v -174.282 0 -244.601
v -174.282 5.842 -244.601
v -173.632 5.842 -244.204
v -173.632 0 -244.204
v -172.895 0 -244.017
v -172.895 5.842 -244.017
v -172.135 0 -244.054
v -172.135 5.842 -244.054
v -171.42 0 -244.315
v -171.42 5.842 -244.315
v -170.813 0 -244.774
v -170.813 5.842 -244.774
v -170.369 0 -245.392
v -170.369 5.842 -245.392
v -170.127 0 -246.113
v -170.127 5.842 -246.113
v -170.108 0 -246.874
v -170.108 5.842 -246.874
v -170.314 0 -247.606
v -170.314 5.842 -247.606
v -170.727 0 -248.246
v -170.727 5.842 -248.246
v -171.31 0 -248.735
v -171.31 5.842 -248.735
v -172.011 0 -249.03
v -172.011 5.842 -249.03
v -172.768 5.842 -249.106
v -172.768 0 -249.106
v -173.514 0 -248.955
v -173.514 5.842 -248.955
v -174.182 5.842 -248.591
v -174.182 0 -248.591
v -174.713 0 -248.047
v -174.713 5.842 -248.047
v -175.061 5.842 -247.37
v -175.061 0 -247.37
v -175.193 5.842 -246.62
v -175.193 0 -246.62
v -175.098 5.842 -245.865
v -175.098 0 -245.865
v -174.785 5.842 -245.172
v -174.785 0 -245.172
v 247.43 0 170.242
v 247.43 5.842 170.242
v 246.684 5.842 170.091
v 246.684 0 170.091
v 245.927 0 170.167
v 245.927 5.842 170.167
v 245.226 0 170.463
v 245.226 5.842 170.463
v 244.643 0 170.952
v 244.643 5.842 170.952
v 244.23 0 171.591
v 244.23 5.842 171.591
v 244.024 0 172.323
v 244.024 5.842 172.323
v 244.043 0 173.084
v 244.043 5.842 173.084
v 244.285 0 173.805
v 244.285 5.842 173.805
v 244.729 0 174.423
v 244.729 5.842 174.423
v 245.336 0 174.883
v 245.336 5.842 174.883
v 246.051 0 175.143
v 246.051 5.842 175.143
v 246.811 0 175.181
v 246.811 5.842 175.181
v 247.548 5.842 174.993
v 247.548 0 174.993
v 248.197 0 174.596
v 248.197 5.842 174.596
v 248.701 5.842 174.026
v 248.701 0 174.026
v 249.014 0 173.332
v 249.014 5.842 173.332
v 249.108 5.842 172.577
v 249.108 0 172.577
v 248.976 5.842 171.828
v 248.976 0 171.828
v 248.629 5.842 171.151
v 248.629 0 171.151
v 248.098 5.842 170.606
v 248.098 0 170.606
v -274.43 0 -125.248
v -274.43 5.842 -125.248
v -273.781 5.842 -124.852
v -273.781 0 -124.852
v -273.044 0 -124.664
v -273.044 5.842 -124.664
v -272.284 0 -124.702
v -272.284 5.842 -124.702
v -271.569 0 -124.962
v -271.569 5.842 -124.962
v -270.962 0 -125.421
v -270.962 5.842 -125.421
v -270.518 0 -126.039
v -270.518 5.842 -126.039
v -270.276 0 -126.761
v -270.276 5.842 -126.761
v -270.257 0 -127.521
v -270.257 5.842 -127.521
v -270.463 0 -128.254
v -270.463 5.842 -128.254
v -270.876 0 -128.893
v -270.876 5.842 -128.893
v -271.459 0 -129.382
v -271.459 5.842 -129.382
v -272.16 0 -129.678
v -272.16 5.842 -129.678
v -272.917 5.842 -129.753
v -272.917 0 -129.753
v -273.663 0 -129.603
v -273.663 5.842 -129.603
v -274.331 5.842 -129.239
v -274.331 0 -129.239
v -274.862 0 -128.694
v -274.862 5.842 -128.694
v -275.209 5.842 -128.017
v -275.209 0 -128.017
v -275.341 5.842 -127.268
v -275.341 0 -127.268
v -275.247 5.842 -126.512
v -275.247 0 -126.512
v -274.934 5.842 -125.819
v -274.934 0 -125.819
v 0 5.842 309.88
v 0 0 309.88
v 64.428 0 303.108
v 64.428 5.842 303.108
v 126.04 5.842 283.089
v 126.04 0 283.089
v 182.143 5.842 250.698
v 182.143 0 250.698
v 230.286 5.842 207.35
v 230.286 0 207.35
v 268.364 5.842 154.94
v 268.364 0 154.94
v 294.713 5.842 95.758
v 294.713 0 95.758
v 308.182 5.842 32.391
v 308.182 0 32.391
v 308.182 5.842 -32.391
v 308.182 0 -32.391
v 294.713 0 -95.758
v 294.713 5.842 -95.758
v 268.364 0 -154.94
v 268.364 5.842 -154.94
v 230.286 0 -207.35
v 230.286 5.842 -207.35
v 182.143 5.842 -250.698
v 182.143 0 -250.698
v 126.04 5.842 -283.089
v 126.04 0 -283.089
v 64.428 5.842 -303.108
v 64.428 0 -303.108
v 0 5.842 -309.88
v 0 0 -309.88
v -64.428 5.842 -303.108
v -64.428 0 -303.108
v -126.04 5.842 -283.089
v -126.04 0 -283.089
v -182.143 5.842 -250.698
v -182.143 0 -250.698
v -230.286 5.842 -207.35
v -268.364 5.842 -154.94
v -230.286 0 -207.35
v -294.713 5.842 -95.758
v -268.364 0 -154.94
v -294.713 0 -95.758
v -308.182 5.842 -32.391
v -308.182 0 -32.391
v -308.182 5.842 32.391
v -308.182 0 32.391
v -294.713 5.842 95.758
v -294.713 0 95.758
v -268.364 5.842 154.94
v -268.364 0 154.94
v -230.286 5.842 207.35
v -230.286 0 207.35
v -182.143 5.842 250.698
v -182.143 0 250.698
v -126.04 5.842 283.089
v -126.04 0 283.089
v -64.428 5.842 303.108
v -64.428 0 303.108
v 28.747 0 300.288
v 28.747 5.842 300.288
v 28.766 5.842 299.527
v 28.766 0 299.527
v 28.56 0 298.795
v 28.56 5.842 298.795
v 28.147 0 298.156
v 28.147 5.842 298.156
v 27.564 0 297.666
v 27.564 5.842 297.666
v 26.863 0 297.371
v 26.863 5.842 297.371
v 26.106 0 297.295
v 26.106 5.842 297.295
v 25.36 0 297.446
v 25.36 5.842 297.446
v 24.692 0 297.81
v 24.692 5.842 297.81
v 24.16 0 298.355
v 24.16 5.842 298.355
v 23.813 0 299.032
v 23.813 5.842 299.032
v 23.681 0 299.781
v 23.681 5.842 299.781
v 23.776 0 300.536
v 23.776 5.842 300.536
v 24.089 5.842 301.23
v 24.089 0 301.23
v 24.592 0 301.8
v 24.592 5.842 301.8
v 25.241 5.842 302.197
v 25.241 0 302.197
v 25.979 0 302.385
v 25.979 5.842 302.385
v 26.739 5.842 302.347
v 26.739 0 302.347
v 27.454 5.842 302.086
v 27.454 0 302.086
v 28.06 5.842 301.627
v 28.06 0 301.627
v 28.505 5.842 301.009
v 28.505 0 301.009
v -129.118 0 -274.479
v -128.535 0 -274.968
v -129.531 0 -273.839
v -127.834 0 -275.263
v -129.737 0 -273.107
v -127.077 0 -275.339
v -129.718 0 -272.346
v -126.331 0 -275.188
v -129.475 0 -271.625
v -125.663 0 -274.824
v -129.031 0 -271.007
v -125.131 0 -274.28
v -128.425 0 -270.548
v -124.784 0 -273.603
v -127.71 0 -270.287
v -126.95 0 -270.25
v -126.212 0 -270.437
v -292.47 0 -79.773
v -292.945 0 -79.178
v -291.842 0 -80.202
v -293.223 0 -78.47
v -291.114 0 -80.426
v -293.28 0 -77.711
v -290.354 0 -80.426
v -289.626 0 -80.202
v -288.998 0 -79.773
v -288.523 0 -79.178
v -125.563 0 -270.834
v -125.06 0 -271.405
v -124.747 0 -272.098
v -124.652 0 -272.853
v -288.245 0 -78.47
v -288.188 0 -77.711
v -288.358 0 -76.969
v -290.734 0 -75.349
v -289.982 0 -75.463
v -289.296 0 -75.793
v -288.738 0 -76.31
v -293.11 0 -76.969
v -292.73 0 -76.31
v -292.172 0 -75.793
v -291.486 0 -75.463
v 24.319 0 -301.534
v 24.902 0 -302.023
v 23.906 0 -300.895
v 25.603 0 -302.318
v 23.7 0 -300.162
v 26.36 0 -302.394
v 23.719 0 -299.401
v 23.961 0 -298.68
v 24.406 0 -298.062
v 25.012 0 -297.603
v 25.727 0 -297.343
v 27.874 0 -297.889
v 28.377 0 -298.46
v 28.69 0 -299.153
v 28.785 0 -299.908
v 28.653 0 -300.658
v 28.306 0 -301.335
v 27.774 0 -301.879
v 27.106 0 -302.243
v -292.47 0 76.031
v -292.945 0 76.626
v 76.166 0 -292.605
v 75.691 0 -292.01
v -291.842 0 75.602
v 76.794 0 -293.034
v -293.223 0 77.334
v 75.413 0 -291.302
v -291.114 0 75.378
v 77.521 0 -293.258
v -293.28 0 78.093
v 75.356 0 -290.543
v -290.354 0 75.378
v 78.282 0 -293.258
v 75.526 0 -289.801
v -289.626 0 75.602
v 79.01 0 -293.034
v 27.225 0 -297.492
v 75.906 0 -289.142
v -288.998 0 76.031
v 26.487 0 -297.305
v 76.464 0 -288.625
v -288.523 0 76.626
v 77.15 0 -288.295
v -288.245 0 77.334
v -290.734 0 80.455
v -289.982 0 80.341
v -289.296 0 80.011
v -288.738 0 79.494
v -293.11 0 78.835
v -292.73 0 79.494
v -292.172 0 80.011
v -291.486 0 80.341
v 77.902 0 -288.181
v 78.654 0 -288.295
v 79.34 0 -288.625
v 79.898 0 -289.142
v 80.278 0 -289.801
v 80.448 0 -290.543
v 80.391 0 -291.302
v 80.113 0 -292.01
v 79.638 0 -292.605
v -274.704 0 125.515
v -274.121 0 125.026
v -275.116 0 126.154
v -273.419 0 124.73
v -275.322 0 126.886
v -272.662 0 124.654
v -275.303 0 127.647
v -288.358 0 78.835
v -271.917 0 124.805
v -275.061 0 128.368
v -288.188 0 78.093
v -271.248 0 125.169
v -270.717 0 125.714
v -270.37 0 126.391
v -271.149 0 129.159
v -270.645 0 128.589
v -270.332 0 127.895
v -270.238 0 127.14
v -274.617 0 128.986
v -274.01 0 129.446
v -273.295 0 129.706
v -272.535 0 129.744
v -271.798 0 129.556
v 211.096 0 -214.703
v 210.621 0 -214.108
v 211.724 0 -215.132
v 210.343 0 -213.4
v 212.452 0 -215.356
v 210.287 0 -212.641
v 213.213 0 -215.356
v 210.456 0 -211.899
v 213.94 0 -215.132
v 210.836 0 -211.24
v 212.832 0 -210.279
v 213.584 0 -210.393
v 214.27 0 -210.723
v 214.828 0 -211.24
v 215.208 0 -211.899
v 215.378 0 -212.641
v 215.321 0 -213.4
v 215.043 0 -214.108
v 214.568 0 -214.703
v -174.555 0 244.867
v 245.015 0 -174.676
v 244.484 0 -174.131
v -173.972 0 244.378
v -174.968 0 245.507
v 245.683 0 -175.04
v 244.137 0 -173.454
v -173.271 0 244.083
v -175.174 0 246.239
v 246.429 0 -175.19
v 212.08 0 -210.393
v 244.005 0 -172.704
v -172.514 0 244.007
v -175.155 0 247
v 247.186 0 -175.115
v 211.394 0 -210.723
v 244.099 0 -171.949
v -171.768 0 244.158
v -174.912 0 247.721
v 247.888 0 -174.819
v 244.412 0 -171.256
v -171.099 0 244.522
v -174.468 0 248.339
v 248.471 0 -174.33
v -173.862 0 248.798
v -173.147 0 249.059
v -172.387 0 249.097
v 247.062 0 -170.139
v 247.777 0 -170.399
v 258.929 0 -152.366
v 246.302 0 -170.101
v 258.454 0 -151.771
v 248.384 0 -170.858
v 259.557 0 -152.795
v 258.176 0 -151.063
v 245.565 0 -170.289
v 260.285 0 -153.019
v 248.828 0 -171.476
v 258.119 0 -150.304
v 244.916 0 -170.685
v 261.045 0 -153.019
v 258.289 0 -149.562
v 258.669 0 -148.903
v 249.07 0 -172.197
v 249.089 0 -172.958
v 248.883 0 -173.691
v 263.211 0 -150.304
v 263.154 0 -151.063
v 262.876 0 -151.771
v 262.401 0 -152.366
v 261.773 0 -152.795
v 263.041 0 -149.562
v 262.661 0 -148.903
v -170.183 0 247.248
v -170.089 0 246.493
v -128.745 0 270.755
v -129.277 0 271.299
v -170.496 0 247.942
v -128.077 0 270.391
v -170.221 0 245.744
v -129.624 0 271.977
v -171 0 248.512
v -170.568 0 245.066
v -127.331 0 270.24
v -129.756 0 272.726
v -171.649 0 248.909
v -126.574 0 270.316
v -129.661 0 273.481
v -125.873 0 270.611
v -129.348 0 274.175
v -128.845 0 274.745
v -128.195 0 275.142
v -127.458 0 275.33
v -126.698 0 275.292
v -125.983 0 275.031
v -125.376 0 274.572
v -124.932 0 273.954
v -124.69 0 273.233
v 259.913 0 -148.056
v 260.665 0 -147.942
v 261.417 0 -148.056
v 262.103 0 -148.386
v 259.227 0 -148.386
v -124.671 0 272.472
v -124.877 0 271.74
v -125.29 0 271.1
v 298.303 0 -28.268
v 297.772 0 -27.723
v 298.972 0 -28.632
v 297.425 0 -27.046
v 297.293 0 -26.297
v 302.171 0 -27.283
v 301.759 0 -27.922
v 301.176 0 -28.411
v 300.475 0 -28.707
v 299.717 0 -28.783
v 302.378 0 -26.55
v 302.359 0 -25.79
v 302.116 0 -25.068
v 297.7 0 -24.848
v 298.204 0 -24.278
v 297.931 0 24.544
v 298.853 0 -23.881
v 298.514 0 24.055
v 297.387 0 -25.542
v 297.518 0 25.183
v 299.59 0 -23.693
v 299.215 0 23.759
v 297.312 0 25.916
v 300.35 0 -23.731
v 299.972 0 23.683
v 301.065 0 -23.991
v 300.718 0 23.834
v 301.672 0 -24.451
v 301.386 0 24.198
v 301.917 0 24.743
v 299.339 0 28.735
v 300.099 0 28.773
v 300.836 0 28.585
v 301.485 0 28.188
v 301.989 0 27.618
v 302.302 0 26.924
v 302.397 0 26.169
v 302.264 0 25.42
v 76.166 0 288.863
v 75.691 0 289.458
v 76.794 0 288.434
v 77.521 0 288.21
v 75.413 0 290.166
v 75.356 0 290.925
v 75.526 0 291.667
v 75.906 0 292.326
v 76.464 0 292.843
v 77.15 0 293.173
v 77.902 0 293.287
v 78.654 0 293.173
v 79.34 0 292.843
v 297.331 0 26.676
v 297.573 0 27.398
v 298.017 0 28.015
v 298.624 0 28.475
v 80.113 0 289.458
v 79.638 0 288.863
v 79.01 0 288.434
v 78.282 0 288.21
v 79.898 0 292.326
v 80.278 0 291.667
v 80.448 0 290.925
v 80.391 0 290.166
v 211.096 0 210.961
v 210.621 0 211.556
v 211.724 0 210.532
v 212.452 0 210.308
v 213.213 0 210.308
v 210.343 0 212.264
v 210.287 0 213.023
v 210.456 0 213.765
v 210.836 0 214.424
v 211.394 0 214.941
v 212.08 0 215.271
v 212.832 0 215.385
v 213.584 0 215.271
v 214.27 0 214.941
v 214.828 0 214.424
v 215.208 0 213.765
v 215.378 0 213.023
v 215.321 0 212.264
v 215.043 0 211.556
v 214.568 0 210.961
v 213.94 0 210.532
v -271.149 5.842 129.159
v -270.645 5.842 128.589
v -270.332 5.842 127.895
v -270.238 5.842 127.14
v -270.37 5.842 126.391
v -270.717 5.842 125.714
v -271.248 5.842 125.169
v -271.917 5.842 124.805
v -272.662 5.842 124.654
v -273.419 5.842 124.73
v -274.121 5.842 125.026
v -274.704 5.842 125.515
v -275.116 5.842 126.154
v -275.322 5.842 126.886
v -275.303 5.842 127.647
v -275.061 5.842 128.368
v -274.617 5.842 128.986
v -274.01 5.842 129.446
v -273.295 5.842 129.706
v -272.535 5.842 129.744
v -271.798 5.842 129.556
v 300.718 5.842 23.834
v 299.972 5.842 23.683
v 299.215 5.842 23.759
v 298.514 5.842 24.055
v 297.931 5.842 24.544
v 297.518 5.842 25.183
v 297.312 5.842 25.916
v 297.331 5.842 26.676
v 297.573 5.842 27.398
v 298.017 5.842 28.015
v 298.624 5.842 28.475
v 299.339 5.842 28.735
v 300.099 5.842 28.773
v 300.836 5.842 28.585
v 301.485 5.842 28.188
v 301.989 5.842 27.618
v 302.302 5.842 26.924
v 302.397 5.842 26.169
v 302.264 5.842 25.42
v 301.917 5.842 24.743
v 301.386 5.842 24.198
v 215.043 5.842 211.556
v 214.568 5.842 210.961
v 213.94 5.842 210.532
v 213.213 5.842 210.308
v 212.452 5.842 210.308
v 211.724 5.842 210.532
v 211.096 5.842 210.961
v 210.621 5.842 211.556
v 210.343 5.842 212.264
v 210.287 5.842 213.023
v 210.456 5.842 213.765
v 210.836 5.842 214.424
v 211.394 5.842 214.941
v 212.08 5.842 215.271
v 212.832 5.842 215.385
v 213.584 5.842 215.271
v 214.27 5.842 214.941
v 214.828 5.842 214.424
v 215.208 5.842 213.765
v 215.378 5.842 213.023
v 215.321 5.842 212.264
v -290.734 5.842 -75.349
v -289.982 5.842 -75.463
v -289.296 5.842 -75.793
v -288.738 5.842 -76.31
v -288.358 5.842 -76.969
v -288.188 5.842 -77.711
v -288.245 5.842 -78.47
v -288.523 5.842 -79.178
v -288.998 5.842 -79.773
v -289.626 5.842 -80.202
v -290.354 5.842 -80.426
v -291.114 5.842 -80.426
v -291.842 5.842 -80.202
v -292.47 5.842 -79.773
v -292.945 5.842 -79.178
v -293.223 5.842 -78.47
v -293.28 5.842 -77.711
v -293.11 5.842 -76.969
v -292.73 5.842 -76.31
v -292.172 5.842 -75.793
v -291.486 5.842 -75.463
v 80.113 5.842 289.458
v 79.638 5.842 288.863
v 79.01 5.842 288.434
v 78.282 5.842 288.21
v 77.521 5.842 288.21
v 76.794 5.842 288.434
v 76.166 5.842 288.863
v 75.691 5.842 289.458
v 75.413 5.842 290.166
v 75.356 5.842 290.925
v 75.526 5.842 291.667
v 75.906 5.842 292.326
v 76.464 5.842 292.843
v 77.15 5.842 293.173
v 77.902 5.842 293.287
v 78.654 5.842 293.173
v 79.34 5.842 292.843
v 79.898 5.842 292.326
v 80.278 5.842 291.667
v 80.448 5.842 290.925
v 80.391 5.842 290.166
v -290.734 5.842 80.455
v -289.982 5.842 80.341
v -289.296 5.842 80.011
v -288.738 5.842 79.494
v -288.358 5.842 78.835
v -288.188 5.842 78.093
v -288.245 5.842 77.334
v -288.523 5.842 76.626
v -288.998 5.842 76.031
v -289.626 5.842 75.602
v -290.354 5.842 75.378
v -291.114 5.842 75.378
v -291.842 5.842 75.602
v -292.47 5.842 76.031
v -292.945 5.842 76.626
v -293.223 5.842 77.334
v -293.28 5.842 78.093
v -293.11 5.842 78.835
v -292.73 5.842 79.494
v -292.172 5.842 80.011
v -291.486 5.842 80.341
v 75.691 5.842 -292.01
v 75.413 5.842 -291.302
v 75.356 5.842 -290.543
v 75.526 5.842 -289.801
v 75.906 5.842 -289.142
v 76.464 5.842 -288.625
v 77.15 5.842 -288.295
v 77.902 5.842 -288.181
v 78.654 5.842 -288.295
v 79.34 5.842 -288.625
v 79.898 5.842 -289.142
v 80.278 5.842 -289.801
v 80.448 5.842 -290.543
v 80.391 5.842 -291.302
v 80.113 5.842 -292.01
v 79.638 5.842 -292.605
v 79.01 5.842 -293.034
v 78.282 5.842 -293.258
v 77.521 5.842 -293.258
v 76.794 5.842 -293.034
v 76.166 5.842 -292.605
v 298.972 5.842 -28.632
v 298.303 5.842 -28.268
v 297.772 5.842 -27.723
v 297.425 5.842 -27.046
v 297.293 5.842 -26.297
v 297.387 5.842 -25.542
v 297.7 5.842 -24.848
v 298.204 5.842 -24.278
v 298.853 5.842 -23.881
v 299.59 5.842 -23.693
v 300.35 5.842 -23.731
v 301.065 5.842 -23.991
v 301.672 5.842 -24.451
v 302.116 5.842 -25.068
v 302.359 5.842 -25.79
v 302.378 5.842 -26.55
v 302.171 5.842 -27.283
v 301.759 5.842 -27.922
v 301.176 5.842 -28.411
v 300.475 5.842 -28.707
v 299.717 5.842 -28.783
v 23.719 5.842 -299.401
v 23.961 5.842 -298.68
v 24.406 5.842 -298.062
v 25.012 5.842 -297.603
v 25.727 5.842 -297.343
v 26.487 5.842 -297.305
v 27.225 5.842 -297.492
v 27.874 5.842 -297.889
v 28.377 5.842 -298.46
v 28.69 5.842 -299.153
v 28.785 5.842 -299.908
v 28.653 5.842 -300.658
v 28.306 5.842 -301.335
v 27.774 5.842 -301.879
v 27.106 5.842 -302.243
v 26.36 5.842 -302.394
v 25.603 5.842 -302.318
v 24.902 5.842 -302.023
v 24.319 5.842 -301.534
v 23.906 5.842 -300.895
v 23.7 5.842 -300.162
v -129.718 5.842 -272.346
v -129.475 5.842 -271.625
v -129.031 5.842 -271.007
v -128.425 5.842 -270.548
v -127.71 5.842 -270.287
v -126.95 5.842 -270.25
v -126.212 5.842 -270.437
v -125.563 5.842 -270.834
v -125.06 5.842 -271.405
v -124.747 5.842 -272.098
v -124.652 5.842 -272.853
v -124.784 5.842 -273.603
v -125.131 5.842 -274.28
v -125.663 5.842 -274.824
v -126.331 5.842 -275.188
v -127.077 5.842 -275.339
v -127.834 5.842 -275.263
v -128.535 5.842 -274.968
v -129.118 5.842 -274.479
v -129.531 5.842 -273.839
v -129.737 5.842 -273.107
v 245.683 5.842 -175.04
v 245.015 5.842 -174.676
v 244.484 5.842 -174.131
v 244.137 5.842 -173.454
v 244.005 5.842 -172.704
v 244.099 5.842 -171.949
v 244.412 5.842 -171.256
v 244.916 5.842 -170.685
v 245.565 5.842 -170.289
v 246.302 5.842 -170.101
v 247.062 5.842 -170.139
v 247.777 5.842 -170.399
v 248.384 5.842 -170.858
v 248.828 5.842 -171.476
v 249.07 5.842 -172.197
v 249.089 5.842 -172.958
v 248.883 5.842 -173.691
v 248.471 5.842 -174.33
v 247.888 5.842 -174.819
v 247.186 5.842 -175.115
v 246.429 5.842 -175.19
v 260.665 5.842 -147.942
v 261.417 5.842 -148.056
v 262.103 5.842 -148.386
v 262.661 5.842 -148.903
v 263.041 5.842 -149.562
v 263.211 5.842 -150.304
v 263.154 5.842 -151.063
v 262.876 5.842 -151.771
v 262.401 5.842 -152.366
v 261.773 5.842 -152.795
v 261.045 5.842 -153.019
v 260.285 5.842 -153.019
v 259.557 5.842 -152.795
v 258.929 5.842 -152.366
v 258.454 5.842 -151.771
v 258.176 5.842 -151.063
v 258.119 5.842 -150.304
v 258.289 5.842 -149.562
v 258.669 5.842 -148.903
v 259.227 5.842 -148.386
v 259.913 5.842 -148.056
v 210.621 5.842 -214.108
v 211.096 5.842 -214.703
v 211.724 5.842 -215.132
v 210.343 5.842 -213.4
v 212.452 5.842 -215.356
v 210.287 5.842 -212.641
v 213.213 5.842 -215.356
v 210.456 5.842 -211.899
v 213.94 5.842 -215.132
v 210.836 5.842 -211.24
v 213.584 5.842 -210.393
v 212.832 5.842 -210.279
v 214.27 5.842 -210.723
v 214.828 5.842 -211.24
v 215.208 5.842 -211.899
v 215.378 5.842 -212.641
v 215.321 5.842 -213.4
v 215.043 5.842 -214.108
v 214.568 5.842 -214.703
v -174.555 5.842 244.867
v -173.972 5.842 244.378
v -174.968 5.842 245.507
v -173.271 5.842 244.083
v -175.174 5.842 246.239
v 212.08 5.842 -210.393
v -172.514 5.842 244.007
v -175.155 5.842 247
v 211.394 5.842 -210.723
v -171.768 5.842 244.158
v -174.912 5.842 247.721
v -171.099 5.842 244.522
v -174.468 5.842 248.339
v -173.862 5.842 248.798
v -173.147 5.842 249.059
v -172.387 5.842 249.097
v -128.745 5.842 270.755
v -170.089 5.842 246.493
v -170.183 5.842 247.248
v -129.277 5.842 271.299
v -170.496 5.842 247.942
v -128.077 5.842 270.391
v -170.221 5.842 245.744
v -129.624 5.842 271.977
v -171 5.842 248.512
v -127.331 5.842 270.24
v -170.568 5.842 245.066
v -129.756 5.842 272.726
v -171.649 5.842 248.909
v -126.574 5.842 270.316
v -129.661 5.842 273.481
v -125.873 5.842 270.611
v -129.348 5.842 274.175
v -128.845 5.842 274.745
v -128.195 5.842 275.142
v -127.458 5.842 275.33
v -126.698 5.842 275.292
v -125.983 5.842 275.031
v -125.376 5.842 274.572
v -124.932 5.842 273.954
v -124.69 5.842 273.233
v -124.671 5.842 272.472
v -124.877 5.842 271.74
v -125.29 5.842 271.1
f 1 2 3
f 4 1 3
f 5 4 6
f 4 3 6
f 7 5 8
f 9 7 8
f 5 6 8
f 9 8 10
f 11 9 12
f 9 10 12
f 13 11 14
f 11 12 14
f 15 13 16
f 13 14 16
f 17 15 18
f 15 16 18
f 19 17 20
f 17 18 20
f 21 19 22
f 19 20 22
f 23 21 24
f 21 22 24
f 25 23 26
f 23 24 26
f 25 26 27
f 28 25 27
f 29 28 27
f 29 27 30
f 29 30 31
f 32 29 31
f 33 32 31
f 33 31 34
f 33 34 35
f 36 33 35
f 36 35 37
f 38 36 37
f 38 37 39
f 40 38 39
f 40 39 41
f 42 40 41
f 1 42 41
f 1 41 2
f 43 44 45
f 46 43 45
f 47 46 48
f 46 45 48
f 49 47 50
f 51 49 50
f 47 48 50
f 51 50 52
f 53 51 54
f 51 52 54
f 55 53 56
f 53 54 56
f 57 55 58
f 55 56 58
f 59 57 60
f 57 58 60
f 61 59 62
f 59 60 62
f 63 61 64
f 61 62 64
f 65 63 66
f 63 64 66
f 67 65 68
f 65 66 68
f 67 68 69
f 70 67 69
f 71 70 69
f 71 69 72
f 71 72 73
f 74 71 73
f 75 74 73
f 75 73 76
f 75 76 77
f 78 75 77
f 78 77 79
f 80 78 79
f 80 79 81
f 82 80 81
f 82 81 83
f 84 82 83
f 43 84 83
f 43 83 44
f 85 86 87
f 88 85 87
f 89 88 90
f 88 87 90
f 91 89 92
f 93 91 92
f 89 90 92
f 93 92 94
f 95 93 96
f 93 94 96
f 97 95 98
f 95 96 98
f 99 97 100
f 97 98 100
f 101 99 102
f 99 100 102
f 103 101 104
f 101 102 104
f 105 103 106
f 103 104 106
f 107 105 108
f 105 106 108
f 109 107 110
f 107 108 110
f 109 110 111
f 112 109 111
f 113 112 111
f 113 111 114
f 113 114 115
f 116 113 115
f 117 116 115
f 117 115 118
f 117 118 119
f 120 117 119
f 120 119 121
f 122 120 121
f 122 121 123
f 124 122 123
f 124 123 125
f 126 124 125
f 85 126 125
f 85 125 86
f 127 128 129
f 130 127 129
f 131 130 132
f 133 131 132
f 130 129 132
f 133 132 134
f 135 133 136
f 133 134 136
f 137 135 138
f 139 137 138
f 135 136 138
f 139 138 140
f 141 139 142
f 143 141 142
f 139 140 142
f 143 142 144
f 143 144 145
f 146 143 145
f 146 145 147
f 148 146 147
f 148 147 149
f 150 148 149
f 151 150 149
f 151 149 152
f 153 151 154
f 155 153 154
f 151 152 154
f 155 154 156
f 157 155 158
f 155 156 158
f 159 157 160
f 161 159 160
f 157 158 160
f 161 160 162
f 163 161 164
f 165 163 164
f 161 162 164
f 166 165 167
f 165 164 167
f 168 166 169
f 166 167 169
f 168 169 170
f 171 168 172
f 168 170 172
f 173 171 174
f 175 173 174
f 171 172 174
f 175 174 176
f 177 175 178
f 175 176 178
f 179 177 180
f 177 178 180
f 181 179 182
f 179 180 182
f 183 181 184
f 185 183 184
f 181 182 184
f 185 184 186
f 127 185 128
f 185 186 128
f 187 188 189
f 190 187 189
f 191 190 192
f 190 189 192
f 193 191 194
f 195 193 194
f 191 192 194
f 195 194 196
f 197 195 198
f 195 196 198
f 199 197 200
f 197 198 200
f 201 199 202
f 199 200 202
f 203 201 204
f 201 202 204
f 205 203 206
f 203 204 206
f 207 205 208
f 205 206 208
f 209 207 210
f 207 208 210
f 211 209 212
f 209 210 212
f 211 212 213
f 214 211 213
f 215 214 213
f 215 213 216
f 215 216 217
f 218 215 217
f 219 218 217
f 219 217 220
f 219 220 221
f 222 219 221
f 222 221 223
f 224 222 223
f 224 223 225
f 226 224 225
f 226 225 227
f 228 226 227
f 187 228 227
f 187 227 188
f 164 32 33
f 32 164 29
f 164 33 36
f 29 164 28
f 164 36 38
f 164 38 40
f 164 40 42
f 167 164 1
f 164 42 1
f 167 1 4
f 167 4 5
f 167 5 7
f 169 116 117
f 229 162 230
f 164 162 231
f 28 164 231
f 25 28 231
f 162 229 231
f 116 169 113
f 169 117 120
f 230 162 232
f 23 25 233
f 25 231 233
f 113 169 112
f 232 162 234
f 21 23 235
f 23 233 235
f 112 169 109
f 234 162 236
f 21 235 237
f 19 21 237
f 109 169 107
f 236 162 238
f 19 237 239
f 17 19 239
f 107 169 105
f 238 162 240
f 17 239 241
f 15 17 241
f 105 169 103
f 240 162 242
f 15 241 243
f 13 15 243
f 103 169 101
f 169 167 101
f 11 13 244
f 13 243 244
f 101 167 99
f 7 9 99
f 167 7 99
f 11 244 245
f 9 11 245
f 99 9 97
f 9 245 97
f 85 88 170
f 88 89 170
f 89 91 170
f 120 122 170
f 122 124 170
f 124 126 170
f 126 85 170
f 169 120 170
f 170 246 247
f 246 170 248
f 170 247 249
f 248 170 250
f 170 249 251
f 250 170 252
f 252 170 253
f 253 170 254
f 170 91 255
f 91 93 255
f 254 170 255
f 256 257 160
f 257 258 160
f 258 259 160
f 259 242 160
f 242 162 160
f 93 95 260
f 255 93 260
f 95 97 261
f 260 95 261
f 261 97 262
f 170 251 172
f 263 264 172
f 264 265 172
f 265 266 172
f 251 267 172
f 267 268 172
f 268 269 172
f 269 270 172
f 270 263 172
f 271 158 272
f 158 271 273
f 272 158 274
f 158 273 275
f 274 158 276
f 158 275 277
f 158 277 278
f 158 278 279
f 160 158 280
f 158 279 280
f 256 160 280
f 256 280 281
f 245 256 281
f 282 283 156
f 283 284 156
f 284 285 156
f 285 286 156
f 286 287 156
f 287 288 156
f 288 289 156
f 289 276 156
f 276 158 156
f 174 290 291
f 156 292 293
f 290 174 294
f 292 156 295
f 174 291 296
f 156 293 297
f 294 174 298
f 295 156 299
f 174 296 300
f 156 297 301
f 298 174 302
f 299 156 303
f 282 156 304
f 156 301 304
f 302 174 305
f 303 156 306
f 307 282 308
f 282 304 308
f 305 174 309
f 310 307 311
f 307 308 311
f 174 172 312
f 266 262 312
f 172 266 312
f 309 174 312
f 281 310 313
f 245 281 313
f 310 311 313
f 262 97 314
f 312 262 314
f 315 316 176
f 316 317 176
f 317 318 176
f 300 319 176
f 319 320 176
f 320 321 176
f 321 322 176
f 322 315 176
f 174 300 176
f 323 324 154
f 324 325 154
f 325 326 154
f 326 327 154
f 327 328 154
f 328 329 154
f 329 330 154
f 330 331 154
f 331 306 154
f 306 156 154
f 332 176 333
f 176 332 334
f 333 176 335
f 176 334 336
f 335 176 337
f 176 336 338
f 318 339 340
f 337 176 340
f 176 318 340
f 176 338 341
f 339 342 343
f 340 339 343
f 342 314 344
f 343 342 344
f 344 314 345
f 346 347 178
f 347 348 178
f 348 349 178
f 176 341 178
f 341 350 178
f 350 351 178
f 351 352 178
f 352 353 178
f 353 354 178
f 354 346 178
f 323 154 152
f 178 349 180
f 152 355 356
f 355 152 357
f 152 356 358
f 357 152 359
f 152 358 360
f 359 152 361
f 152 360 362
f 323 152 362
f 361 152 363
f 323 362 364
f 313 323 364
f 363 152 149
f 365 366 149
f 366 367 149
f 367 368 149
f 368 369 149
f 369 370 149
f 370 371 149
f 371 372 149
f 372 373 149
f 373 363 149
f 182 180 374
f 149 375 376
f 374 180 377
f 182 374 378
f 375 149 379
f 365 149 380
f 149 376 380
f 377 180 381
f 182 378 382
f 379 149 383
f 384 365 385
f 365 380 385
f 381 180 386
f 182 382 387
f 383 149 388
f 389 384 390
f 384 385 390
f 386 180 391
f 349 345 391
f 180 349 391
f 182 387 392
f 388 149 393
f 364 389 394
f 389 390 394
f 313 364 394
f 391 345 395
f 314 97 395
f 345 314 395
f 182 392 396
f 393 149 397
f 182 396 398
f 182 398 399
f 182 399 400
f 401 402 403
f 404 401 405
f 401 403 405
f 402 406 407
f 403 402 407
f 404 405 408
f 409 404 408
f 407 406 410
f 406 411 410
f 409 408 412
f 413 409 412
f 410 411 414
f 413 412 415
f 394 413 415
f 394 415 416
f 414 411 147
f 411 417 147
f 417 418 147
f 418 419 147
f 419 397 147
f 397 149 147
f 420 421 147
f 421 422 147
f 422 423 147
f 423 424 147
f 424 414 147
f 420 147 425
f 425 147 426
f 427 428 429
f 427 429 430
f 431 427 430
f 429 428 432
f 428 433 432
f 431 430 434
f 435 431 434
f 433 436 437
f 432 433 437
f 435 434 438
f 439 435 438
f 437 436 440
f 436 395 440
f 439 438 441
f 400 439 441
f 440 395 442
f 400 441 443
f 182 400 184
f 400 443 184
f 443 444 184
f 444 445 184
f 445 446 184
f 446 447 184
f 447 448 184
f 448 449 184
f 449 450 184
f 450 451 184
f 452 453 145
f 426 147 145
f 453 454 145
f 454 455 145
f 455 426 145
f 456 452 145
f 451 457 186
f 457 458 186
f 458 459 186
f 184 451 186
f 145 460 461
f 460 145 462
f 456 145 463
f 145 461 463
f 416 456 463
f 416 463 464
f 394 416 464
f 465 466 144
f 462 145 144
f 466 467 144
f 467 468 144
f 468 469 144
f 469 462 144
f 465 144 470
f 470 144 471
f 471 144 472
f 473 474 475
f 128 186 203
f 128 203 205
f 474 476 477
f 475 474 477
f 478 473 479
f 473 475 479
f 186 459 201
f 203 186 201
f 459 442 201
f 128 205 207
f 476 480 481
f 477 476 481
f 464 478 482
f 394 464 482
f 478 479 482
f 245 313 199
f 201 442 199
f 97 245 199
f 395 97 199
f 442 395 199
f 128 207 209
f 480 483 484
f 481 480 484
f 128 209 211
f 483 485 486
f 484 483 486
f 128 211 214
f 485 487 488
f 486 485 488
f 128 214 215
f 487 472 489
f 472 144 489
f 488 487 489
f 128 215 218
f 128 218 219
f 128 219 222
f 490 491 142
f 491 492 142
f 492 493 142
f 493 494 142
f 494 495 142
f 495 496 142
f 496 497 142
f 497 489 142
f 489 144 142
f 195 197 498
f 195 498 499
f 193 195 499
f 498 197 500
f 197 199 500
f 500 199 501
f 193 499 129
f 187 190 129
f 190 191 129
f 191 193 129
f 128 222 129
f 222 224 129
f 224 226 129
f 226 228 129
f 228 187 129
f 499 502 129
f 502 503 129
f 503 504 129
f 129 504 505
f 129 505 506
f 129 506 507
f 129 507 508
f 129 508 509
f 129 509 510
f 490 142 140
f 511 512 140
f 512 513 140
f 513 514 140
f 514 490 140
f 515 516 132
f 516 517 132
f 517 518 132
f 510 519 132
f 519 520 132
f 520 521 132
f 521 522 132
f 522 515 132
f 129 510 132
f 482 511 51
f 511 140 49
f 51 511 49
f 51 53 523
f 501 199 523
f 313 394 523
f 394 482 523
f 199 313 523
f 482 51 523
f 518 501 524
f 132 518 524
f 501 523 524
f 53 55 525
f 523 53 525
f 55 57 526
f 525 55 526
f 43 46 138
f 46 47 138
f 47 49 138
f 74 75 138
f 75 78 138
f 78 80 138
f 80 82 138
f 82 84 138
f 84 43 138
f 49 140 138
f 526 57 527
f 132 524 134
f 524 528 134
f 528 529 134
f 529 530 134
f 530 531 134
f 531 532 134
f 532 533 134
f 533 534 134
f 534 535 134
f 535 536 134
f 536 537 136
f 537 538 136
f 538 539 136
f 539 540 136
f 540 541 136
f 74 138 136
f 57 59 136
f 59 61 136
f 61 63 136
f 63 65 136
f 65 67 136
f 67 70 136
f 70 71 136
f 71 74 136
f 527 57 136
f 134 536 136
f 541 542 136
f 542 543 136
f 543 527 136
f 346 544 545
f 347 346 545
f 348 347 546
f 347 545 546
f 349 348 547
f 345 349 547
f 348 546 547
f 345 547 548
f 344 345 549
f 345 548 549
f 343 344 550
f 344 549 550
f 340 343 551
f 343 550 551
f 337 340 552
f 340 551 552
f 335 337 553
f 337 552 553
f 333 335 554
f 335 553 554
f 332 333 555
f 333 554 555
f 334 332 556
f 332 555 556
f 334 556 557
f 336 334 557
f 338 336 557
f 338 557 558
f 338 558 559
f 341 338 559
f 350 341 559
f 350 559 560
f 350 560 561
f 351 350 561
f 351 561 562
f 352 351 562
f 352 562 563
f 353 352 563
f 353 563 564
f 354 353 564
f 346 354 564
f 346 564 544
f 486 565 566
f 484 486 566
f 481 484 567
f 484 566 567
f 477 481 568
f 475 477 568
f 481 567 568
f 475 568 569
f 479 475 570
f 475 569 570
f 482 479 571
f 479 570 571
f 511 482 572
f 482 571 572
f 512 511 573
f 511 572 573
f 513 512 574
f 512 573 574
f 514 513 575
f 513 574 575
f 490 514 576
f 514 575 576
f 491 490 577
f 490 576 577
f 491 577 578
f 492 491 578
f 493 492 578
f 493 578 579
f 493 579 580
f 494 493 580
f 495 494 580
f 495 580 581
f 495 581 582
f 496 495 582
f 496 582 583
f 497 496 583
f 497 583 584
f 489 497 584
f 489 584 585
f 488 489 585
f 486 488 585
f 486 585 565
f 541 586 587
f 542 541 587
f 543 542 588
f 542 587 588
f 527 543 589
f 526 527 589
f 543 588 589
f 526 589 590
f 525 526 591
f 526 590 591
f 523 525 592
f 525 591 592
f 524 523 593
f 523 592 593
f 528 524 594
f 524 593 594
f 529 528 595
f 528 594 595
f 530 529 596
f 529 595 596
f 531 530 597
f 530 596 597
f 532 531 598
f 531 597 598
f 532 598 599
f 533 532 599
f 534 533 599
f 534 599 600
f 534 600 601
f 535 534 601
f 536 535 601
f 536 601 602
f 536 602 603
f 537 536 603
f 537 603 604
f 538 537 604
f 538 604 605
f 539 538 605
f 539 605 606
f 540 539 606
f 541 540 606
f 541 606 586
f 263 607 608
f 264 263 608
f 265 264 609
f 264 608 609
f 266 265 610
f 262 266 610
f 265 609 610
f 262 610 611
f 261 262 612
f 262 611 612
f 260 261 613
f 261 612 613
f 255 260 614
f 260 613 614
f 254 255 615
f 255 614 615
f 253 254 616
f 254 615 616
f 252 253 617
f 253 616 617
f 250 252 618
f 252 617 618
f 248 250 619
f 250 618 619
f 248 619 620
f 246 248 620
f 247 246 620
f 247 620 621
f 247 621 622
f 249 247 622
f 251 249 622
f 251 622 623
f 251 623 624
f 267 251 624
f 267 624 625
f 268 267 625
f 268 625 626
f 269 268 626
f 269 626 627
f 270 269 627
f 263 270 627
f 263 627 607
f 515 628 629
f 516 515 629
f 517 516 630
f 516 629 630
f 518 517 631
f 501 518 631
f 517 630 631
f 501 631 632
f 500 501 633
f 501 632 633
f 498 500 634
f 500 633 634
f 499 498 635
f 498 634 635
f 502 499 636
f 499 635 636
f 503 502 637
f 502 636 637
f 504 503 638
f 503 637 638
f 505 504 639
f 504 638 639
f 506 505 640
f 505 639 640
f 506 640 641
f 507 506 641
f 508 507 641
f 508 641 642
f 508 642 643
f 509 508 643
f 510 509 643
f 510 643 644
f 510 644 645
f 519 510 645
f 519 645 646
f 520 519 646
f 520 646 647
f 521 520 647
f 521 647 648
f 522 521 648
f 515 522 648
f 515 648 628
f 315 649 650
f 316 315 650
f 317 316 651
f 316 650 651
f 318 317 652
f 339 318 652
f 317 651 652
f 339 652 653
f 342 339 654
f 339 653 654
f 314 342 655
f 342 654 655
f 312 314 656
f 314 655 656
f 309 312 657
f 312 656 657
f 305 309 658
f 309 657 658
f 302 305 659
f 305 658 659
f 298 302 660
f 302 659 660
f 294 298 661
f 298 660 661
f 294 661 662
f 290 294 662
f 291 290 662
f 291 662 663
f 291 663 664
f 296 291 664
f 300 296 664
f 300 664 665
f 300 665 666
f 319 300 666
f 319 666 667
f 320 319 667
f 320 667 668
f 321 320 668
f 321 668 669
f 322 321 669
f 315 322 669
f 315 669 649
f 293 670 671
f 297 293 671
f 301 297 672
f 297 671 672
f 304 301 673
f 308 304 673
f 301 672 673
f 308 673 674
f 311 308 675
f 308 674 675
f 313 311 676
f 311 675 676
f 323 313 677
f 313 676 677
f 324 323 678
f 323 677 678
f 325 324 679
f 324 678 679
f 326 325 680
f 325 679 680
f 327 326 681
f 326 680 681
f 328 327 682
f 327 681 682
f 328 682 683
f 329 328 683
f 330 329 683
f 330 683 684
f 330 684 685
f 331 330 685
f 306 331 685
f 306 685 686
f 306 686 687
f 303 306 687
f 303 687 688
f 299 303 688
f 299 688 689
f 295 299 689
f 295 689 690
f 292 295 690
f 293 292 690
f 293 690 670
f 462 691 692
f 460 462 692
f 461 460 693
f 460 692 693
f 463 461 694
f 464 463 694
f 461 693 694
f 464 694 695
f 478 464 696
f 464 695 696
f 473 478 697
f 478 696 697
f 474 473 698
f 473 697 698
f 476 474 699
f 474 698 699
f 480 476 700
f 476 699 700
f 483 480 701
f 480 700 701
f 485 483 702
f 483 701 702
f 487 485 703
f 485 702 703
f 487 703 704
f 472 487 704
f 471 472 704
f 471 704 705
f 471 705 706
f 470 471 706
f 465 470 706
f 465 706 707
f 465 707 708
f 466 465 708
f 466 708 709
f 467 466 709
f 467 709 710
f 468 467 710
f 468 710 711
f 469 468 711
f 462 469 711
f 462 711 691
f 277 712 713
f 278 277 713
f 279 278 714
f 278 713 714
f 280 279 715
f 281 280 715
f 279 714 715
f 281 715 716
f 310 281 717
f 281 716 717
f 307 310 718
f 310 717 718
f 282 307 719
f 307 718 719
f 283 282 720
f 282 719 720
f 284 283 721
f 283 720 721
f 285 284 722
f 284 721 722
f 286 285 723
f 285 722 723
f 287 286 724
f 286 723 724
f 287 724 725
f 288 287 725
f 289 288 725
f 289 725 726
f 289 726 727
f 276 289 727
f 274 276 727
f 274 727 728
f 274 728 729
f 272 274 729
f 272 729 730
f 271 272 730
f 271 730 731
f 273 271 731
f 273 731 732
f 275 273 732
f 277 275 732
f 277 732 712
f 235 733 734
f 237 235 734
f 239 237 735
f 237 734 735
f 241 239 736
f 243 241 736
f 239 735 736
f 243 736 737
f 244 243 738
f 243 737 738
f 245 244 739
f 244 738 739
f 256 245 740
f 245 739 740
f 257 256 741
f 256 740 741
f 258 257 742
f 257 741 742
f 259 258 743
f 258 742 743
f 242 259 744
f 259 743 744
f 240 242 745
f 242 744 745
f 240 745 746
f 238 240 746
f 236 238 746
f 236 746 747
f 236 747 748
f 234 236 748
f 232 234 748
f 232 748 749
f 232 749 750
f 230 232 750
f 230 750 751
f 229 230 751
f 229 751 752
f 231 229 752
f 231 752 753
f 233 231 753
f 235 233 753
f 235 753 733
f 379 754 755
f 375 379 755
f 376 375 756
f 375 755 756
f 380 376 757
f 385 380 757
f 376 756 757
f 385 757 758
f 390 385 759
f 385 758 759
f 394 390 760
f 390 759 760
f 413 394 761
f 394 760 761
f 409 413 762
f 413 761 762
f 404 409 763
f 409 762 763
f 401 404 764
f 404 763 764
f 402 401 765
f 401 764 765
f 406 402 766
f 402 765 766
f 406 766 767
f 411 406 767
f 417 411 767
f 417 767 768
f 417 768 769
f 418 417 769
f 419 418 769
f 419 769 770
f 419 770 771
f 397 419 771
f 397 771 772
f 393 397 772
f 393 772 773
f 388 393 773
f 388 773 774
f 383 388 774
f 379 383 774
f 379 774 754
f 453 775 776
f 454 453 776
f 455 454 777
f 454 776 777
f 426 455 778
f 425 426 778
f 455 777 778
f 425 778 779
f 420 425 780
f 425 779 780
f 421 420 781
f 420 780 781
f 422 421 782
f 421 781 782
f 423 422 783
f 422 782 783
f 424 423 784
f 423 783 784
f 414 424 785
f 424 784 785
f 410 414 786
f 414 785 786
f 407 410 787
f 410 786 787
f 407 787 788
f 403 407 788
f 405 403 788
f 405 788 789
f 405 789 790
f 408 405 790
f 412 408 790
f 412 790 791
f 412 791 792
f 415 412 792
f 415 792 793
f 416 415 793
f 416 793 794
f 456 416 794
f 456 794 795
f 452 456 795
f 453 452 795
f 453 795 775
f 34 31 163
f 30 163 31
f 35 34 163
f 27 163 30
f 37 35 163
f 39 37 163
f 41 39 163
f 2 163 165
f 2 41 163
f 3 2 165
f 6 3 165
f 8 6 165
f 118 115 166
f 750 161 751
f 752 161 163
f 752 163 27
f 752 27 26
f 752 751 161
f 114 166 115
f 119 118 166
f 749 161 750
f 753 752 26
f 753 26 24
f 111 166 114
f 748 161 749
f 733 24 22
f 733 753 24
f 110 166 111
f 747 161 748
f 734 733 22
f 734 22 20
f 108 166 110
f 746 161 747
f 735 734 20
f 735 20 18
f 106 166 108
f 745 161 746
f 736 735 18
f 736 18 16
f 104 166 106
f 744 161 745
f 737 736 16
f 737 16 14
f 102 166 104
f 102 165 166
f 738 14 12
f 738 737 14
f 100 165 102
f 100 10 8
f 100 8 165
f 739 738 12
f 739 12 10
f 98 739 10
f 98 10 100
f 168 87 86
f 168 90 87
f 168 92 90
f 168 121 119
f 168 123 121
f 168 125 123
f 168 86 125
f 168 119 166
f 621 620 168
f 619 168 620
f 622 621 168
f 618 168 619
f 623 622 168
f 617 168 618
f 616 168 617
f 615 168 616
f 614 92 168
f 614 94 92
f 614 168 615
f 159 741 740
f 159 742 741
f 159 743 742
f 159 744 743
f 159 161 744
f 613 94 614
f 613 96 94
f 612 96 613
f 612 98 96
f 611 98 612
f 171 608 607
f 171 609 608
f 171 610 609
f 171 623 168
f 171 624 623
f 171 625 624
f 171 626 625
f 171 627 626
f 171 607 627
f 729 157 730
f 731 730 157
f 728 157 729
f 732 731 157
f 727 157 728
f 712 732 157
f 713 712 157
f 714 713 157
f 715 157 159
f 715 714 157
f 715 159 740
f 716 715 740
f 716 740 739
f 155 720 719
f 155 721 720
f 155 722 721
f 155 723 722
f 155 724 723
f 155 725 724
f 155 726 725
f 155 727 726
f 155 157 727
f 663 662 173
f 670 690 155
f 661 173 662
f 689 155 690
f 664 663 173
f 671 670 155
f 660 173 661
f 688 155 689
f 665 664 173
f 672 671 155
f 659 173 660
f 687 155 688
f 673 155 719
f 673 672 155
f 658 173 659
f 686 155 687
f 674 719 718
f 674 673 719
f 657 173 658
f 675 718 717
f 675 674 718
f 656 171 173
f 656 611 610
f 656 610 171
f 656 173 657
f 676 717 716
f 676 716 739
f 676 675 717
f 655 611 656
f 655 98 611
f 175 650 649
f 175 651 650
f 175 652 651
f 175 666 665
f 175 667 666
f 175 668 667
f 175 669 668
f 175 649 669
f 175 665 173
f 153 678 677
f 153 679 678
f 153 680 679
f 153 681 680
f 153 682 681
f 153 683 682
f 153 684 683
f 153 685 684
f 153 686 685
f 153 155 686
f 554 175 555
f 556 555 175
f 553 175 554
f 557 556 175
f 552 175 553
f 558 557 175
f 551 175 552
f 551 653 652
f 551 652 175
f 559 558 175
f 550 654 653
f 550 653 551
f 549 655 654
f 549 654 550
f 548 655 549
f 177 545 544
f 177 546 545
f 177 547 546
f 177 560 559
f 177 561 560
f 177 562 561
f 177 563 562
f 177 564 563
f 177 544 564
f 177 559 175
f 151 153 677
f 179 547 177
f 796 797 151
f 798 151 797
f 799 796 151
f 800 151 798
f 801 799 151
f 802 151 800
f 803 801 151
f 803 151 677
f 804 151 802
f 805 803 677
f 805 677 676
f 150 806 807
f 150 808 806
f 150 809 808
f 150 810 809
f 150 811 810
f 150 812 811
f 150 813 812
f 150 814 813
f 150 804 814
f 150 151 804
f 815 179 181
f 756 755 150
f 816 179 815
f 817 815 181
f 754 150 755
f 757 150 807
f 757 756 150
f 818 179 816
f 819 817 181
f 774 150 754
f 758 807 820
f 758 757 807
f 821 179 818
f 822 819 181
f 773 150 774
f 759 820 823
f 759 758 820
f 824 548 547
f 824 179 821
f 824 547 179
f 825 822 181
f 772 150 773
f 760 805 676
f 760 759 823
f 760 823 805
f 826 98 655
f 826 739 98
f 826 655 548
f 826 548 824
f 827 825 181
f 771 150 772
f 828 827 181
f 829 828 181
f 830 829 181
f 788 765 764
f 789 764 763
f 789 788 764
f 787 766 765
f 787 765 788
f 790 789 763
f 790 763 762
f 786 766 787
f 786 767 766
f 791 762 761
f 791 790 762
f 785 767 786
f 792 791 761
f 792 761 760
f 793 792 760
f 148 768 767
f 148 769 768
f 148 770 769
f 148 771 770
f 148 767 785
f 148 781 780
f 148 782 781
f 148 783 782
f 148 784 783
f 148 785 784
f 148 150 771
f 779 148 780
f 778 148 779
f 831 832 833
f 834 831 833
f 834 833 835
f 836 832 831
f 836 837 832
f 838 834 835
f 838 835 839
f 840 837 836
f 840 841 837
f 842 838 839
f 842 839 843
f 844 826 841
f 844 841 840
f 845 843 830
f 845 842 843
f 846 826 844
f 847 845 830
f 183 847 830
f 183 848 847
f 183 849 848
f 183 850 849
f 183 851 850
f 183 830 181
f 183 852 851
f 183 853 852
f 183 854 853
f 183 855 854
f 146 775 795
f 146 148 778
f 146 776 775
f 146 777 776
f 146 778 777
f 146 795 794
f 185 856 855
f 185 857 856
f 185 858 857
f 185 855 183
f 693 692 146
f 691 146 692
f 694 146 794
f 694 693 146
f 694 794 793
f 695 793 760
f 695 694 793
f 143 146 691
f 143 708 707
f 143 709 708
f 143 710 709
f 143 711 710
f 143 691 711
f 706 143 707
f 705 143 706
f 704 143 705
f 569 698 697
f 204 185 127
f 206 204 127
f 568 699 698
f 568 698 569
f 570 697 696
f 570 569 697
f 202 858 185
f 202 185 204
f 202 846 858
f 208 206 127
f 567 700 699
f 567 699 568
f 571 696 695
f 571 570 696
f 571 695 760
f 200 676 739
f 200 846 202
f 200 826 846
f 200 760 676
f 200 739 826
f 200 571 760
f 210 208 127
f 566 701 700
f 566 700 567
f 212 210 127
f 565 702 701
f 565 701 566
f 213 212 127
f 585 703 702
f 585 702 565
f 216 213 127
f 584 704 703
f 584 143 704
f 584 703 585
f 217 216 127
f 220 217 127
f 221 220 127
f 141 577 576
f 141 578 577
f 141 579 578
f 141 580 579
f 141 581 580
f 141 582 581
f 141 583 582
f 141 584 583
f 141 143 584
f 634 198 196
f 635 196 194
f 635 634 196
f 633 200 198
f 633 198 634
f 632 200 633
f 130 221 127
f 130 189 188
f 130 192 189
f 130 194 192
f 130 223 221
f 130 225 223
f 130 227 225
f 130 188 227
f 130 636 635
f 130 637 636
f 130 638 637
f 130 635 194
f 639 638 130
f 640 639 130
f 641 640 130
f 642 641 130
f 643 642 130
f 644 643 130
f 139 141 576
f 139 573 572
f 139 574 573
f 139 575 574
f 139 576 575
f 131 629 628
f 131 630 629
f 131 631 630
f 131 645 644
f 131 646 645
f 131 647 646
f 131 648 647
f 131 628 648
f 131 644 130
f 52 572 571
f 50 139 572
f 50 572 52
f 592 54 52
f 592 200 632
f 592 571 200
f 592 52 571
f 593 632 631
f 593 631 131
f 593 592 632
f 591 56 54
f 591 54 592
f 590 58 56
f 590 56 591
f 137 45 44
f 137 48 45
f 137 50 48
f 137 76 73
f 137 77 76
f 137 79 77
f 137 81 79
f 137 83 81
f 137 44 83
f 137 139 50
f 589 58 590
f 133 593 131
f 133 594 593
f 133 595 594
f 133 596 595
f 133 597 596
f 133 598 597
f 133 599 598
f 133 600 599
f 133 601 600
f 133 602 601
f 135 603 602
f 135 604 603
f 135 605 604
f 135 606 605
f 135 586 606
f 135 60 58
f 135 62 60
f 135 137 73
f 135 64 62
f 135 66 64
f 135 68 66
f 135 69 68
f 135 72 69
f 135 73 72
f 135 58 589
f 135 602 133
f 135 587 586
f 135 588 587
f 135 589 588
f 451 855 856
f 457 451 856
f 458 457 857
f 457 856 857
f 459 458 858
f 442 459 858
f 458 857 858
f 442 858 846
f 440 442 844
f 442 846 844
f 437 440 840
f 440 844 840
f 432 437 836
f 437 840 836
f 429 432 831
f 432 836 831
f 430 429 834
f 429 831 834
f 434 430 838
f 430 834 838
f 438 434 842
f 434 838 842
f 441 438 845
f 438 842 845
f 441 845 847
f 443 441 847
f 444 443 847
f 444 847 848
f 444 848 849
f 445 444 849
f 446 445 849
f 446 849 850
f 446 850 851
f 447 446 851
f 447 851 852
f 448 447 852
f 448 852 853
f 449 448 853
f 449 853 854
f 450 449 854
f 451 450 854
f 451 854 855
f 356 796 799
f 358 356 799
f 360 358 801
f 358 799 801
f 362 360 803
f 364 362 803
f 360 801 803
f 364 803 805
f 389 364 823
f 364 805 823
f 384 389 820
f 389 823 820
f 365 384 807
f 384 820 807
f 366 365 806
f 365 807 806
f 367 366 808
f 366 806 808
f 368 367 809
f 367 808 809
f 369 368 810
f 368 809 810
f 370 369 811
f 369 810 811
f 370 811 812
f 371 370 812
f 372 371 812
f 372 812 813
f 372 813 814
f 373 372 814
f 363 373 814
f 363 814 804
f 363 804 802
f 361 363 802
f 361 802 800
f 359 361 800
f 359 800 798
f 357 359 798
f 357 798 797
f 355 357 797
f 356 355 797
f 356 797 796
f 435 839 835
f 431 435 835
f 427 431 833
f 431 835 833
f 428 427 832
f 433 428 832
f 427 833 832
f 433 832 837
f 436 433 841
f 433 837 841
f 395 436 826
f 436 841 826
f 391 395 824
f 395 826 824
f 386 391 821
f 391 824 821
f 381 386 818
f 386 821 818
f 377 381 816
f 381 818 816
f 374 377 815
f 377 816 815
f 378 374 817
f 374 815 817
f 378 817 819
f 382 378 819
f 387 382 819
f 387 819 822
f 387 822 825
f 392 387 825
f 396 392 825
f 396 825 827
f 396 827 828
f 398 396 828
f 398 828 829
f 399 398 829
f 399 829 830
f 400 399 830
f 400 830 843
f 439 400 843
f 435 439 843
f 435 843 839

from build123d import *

# Parameters (mm, degrees)
SKETCH1_R           = 309.88
BOSS_EXTRUDE1_DEPTH = 5.842
SKETCH2_R           = 2.5527
CUT_EXTRUDE1_DEPTH  = 439.275435958
CIRPATTERN1_COUNT   = 9
SKETCH3_R           = 2.5527
HOLE_WIRE_DEPTH     = 439.275435958


with BuildPart() as part:
    # Sketch1 → Boss-Extrude1 (new body)
    with BuildSketch(Plane(origin=(0, 0, 0), x_dir=(1, 0, 0), z_dir=(0, 1, 0))):
        Circle(SKETCH1_R)
    extrude(amount=BOSS_EXTRUDE1_DEPTH)

    # Sketch2 → Cut-Extrude1 (cut, through all)
    with BuildSketch(Plane(origin=(0, 5.842, 0), x_dir=(1, 0, 0), z_dir=(0, 1, 0))):
        with Locations((-290.734014455, 77.901944385)):
            Circle(SKETCH2_R)
        with Locations((-290.734014455, -77.901944385)):
            Circle(SKETCH2_R)
    cut_extrude1 = extrude(amount=-CUT_EXTRUDE1_DEPTH, mode=Mode.SUBTRACT)

    # CirPattern1: Cut-Extrude1 ×9 about axis
    cirpattern1_axis = Axis((0, 6.6675, 0), (0, -1, 0))
    for i in range(1, CIRPATTERN1_COUNT):
        add(cut_extrude1.rotate(cirpattern1_axis, i * 360 / CIRPATTERN1_COUNT), mode=Mode.SUBTRACT)

    # Sketch3 → Hole_Wire (cut, through all)
    with BuildSketch(Plane(origin=(0, 5.842, 0), x_dir=(1, 0, 0), z_dir=(0, 1, 0))):
        with Locations((260.664986285, 150.495)):
            Circle(SKETCH3_R)
    extrude(amount=-HOLE_WIRE_DEPTH, mode=Mode.SUBTRACT)


solid = part.part
